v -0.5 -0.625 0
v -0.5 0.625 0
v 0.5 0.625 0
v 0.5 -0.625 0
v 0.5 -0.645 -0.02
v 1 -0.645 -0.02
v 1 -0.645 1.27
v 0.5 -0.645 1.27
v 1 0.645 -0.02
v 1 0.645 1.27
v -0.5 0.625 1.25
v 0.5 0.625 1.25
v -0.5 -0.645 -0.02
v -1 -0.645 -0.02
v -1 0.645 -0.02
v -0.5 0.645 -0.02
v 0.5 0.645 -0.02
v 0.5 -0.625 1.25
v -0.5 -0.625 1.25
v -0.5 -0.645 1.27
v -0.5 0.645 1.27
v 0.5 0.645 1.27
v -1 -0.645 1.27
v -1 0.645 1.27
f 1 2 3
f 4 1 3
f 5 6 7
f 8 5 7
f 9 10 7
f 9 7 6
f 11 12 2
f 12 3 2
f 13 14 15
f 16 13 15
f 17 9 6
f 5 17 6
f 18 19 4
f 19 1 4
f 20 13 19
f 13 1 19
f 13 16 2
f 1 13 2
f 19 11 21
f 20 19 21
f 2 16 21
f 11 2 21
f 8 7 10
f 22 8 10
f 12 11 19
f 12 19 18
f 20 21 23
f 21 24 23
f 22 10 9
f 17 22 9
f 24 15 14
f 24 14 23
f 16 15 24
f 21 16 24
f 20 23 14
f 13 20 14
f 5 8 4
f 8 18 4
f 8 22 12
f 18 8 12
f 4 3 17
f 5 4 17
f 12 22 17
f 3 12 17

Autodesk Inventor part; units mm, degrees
ref_plane "YZ Plane" through (0, 0, 0) normal (1, 0, 0) x (0, 1, 0)
ref_plane "XZ Plane" through (0, 0, 0) normal (0, 1, 0) x (-1, 0, 0)
ref_plane "XY Plane" through (0, 0, 0) normal (0, 0, 1) x (1, 0, 0)
sketch "Sketch1" plane through (0, 0, 0) normal (0, 0, 1) x (1, 0, 0)
  line L0 (-1, -0.625) -> (1, -0.625)
  line L1 (1, -0.625) -> (1, 0.625)
  line L2 (1, 0.625) -> (-1, 0.625)
  line L3 (-1, 0.625) -> (-1, -0.625)
  line L4 (-1, -0.625) -> (1, 0.625) construction
  line L5 (1, -0.625) -> (-1, 0.625) construction
  point P0 (0, 0)
  dimension "d0" = 2
  dimension "d1" = 1.25
extrude "Extrusion1" add sketch "Sketch1" along normal blind 1.25
sketch "Sketch2" plane through (1, -0.625, 0) normal (1, 0, 0) x (0, 0, -1)
  line L0 (0, 0) -> (0, 1.25) projected
  line L1 (0, 1.25) -> (-1.25, 1.25) projected
  line L2 (-1.25, 0) -> (-1.25, 1.25) projected
  line L3 (0, 0) -> (-1.25, 0) projected
  line L4 (-1.27, 1.27) -> (0.02, 1.27)
  line L5 (0.02, 1.27) -> (0.02, -0.02)
  line L6 (0.02, -0.02) -> (-1.27, -0.02)
  line L7 (-1.27, -0.02) -> (-1.27, 1.27)
  point P0 (0, 0.625)
  dimension "d4" = 0.02
extrude "Extrusion2" add sketch "Sketch2" against normal blind 0.5
sketch "Sketch3" plane through (-1, -0.625, 0) normal (-1, 0, 0) x (0, 0, 1)
  line L0 (0, 1.25) -> (0, 0) projected
  line L1 (0, 0) -> (1.25, 0) projected
  line L2 (1.25, 1.25) -> (1.25, 0) projected
  line L3 (0, 1.25) -> (1.25, 1.25) projected
  line L4 (1.27, -0.02) -> (-0.02, -0.02)
  line L5 (-0.02, -0.02) -> (-0.02, 1.27)
  line L6 (-0.02, 1.27) -> (1.27, 1.27)
  line L7 (1.27, 1.27) -> (1.27, -0.02)
  point P0 (0, 0.625)
  dimension "d7" = 0.02
extrude "Extrusion3" add sketch "Sketch3" against normal blind 0.5
properties part number "0805 Capacitor" material "ABS Plastic"
